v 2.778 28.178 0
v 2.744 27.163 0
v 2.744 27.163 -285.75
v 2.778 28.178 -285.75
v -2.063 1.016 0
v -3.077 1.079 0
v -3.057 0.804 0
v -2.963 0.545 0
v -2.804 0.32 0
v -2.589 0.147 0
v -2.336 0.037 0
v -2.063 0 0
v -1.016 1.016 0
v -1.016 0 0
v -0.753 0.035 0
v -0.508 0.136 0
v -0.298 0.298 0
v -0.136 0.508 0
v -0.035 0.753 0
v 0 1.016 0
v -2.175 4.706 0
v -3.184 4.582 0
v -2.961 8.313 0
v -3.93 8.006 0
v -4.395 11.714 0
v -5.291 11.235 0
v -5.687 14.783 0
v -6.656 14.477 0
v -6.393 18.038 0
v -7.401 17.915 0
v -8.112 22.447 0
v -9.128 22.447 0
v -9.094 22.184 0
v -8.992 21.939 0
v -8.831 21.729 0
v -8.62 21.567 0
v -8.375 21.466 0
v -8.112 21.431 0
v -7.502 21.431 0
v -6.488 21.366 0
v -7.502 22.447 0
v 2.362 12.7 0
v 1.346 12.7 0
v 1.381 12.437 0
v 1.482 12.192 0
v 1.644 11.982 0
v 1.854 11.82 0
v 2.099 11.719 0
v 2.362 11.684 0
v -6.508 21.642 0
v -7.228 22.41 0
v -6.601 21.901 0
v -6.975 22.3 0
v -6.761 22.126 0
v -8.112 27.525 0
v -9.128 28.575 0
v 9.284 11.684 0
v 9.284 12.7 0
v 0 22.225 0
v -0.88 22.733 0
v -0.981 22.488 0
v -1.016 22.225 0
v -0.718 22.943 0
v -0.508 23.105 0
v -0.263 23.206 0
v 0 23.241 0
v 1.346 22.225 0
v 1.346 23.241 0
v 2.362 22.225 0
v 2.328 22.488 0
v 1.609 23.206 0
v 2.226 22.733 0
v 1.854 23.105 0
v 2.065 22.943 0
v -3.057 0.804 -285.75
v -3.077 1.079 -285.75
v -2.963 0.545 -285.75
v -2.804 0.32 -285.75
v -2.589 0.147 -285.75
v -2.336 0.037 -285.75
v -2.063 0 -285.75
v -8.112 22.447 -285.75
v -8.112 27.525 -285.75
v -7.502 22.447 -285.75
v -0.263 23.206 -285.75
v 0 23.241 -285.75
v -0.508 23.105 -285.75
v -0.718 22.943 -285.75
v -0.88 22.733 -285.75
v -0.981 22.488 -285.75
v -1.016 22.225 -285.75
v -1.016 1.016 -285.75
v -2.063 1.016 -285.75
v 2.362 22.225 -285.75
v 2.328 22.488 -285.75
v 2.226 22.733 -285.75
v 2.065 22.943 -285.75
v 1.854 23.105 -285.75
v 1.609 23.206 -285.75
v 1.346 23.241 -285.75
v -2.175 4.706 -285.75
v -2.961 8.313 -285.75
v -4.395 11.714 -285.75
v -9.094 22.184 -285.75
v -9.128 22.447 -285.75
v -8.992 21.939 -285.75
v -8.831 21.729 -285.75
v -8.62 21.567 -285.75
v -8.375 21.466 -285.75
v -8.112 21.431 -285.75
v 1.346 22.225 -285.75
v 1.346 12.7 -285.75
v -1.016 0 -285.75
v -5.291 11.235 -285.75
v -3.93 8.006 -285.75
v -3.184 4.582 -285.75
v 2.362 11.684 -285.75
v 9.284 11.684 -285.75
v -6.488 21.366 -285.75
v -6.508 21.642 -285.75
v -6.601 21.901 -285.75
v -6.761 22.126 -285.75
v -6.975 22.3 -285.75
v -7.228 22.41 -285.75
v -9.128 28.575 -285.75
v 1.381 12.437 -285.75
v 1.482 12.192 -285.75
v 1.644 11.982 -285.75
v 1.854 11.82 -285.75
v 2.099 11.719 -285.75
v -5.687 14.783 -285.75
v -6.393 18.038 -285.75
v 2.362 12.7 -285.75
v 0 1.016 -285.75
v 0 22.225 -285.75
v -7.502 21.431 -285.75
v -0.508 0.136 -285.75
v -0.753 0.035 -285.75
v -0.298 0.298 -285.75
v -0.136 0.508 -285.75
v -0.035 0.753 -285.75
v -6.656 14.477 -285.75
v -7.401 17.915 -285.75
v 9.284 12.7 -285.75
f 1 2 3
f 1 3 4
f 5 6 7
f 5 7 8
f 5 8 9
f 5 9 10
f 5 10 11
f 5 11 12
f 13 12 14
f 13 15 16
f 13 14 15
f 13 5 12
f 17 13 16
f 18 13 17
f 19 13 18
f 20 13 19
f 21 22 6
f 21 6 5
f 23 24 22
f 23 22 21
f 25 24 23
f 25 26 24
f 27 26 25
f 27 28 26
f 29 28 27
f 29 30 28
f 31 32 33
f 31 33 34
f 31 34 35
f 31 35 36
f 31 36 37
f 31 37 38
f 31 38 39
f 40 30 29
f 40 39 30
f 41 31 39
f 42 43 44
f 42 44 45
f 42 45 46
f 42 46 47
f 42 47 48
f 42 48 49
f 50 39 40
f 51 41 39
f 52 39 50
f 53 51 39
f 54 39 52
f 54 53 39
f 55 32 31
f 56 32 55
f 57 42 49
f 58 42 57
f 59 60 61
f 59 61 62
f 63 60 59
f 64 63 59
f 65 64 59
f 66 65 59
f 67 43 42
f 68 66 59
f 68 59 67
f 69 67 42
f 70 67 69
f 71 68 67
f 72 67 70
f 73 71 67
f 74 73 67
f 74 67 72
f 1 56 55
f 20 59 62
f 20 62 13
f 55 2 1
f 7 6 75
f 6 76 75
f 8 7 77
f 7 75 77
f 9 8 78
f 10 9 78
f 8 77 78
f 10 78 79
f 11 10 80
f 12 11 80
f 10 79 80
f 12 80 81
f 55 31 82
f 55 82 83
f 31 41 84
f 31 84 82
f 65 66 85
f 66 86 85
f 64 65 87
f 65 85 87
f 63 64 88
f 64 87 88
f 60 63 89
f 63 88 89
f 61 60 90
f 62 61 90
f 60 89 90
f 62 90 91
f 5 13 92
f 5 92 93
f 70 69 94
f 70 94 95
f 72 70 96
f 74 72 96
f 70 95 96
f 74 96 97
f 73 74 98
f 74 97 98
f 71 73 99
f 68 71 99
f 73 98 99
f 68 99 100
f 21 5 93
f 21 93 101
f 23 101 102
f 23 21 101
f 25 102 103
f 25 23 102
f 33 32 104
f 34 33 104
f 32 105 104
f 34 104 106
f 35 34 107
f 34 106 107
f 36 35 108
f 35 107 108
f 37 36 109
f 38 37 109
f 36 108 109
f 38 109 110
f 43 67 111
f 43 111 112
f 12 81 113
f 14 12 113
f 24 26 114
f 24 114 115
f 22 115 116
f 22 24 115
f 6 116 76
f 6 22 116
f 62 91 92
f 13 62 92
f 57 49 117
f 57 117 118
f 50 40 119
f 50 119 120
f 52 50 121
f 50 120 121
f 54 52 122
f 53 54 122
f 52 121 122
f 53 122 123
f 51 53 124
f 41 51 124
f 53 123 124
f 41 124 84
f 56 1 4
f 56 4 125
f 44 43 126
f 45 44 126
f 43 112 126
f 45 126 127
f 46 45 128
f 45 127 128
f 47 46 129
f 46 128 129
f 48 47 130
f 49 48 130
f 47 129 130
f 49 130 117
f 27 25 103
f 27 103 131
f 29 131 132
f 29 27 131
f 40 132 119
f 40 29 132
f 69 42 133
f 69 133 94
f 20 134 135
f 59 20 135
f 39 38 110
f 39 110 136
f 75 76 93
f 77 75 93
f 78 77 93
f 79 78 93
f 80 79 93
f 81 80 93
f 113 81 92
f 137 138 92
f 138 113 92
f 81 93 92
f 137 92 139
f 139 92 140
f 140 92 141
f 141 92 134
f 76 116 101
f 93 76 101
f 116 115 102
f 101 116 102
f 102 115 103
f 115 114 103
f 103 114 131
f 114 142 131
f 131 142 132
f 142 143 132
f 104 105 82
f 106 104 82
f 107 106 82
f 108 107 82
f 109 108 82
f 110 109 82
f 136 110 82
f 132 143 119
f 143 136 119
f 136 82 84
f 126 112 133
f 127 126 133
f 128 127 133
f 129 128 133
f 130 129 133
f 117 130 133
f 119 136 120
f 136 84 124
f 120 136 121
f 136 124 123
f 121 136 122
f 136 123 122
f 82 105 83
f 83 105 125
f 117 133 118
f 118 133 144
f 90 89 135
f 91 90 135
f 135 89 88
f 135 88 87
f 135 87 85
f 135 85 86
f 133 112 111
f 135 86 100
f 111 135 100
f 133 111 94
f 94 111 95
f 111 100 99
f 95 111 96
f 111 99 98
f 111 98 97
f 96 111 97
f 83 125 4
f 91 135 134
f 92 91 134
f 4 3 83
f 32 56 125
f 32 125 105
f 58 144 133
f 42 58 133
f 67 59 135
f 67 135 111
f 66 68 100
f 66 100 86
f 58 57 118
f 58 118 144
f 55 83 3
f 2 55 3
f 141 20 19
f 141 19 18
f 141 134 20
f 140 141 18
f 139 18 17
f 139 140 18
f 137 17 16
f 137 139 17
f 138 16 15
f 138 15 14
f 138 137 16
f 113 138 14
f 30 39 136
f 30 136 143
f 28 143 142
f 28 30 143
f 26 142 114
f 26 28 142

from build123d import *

# Parameters (mm, degrees)
BOSS_EXTRUDE1_DEPTH = 285.75
FILLET1_R           = 1.016


with BuildPart() as part:
    # Sketch1 → Boss-Extrude1 (new body)
    with BuildSketch(Plane.XY):
        with BuildLine():
            Line((0, 0), (0, 22.225))
            Line((0, 22.225), (1.3462, 22.225))
            Line((1.3462, 22.225), (1.3462, 11.684))
            Line((1.3462, 11.684), (9.2837, 11.684))
            Line((9.2837, 11.684), (9.2837, 12.7))
            Line((9.2837, 12.7), (2.3622, 12.7))
            Line((2.3622, 12.7), (2.3622, 23.241))
            Line((2.3622, 23.241), (-1.016, 23.241))
            Line((-1.016, 23.241), (-1.016, 1.016))
            Line((-1.016, 1.016), (-2.063377597, 1.016))
            ThreePointArc((-2.063377597, 1.016), (-2.48529022, 6.527253883), (-4.39485769, 11.714303305))
            ThreePointArc((-4.39485769, 11.714303305), (-6.222056703, 16.926496827), (-6.386074797, 22.44725))
            Line((-6.386074797, 22.44725), (-8.112125, 22.44725))
            Line((-8.112125, 22.44725), (-8.112125, 27.524569046))
            Line((-8.112125, 27.524569046), (2.744277132, 27.162688975))
            Line((2.744277132, 27.162688975), (2.778125, 28.178125))
            Line((2.778125, 28.178125), (-9.128125, 28.575))
            Line((-9.128125, 28.575), (-9.128125, 21.43125))
            Line((-9.128125, 21.43125), (-7.501829835, 21.43125))
            ThreePointArc((-7.501829835, 21.43125), (-7.107934178, 16.178984322), (-5.290870799, 11.235328872))
            ThreePointArc((-5.290870799, 11.235328872), (-3.370198099, 5.780137709), (-3.175, 0))
            Line((-3.175, 0), (0, 0))
        make_face()
    extrude(amount=-BOSS_EXTRUDE1_DEPTH)

    # Fillet1
    fillet1_edges = [part.edges().sort_by_distance(p)[0] for p in [
        (-3.175, 0, -142.875),
        (-9.128125, 21.43125, -142.875),
        (-6.386074797, 22.44725, -142.875),
        (-1.016, 23.241, -142.875),
        (2.3622, 23.241, -142.875),
        (1.3462, 11.684, -142.875),
        (0, 0, -142.875),
    ]]
    fillet(fillet1_edges, radius=FILLET1_R)


solid = part.part
